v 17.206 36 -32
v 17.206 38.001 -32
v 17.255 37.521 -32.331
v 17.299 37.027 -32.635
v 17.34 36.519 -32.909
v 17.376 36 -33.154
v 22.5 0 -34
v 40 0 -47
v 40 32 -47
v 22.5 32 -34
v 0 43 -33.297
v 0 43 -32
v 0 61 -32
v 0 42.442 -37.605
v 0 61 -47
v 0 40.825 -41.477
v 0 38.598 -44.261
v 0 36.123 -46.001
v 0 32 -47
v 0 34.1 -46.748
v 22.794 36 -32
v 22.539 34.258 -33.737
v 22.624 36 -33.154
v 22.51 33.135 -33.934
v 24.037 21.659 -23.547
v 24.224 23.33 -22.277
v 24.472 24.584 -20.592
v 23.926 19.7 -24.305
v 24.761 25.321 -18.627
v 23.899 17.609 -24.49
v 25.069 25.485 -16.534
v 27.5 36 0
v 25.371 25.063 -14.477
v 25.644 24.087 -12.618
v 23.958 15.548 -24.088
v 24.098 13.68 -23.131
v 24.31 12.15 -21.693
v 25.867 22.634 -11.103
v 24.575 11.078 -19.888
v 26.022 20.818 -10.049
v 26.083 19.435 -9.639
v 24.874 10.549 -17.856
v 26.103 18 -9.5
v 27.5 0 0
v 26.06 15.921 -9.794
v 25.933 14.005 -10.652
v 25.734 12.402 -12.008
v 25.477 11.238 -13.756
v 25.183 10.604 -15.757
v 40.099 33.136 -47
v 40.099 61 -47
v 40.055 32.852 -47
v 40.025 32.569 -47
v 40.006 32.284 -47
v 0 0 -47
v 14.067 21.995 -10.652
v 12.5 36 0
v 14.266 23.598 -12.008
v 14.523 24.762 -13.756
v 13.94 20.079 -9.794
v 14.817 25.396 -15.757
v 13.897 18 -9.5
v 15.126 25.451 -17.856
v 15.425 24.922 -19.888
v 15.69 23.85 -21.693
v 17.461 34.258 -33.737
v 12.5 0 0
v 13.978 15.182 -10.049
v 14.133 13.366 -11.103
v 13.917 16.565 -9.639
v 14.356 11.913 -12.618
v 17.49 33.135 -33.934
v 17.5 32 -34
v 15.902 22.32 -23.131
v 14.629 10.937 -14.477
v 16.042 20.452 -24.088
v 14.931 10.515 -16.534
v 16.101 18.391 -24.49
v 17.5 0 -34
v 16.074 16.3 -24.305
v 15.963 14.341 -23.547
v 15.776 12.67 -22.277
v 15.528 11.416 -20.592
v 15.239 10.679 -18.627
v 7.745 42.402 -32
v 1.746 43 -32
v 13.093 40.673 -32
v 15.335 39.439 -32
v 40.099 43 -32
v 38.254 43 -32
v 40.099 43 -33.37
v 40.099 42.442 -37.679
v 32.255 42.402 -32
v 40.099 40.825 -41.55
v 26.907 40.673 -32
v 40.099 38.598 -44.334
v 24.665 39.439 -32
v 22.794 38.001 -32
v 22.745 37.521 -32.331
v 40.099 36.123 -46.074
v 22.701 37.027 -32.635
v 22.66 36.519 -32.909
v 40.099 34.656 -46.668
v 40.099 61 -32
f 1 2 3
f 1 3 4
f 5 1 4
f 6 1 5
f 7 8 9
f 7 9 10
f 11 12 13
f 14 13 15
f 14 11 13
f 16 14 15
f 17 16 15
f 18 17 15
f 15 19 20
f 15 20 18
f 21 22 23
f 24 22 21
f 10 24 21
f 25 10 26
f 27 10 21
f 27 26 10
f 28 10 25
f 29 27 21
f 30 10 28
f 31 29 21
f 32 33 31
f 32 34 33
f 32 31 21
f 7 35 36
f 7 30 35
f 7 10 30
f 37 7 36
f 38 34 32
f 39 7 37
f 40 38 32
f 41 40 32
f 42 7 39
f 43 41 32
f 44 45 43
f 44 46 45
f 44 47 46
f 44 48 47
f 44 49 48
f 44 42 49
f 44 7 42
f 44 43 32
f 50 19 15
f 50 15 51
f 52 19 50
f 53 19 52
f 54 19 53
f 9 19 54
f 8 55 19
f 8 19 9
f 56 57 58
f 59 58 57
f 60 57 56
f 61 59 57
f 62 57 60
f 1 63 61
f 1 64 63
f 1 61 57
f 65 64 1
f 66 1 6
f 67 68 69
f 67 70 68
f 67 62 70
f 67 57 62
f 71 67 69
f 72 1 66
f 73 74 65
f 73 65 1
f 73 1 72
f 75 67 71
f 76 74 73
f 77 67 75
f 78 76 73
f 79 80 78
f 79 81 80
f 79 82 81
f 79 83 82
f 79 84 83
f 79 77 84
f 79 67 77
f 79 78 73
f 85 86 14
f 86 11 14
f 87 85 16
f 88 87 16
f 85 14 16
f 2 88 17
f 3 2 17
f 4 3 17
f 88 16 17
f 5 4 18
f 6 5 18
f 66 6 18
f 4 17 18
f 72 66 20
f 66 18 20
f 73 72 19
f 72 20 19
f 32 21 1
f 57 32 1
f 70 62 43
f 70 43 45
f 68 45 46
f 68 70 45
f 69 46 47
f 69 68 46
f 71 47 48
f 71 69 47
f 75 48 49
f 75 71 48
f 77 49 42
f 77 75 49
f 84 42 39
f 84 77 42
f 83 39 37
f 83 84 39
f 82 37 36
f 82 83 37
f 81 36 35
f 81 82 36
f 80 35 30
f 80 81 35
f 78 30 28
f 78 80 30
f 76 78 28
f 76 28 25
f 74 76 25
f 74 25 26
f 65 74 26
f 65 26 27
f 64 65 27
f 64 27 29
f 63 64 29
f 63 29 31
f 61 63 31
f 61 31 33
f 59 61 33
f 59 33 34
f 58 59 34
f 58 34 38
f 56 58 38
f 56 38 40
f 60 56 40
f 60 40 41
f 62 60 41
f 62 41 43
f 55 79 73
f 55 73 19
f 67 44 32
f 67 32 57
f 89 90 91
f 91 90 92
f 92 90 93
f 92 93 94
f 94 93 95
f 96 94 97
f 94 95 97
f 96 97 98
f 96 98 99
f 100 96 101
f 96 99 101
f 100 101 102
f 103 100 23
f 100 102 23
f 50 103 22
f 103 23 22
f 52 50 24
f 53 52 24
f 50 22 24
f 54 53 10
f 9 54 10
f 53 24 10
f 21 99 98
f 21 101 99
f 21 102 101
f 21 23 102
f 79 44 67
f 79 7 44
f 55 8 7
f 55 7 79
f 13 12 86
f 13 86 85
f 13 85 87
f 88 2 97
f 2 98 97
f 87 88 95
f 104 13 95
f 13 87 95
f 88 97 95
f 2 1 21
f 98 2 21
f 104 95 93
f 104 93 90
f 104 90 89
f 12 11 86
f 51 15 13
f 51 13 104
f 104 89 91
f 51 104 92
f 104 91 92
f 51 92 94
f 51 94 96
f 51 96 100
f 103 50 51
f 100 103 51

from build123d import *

# Parameters (mm, degrees)
BOSS_EXTRUDE1_DEPTH = 36
SKETCH2_R           = 7.5
CUT_EXTRUDE1_DEPTH  = 72.449282712
BOSS_EXTRUDE5_DEPTH = 7
SKETCH9_W           = 40.098560475
SKETCH9_H           = 15
BOSS_EXTRUDE6_DEPTH = 18
FILLET4_R           = 11


with BuildPart() as part:
    # Sketch1 → Boss-Extrude1 (new body)
    with BuildSketch(Plane(origin=(0, 0, 0), x_dir=(1, 0, 0), z_dir=(0, 1, 0))):
        Polygon((27.5, 0), (12.5, 0), (17.5, 34), (0, 47), (40, 47), (22.5, 34), align=None)
    extrude(amount=BOSS_EXTRUDE1_DEPTH)

    # Sketch2 → Cut-Extrude1 (cut, through all)
    with BuildSketch(Plane(origin=(0, 0, 0), x_dir=(0, 0, -1), z_dir=(1, 0, 0))):
        with Locations(Location((17, 18, 0), (0, 0, 180))):
            Circle(SKETCH2_R)
    extrude(amount=CUT_EXTRUDE1_DEPTH, mode=Mode.SUBTRACT)

    # Sketch7 → Boss-Extrude5 (add)
    with BuildSketch(Plane(origin=(0, 36, 0), x_dir=(1, 0, 0), z_dir=(0, 1, 0))):
        Polygon((0, 47), (40, 47), (22.5, 34), (22.794117647, 32), (17.205882353, 32), (17.5, 34), align=None)
    extrude(amount=BOSS_EXTRUDE5_DEPTH)

    # Sketch9 → Boss-Extrude6 (add)
    with BuildSketch(Plane(origin=(0, 43, 0), x_dir=(1, 0, 0), z_dir=(0, 1, 0))):
        with Locations((20.049280237, 39.5)):
            Rectangle(SKETCH9_W, SKETCH9_H)
    extrude(amount=BOSS_EXTRUDE6_DEPTH)

    # Fillet4
    fillet4_edges = [part.edges().sort_by_distance(p)[0] for p in [
        (31.25, 43, -40.5),
        (8.75, 43, -40.5),
    ]]
    fillet(fillet4_edges, radius=FILLET4_R)


solid = part.part
